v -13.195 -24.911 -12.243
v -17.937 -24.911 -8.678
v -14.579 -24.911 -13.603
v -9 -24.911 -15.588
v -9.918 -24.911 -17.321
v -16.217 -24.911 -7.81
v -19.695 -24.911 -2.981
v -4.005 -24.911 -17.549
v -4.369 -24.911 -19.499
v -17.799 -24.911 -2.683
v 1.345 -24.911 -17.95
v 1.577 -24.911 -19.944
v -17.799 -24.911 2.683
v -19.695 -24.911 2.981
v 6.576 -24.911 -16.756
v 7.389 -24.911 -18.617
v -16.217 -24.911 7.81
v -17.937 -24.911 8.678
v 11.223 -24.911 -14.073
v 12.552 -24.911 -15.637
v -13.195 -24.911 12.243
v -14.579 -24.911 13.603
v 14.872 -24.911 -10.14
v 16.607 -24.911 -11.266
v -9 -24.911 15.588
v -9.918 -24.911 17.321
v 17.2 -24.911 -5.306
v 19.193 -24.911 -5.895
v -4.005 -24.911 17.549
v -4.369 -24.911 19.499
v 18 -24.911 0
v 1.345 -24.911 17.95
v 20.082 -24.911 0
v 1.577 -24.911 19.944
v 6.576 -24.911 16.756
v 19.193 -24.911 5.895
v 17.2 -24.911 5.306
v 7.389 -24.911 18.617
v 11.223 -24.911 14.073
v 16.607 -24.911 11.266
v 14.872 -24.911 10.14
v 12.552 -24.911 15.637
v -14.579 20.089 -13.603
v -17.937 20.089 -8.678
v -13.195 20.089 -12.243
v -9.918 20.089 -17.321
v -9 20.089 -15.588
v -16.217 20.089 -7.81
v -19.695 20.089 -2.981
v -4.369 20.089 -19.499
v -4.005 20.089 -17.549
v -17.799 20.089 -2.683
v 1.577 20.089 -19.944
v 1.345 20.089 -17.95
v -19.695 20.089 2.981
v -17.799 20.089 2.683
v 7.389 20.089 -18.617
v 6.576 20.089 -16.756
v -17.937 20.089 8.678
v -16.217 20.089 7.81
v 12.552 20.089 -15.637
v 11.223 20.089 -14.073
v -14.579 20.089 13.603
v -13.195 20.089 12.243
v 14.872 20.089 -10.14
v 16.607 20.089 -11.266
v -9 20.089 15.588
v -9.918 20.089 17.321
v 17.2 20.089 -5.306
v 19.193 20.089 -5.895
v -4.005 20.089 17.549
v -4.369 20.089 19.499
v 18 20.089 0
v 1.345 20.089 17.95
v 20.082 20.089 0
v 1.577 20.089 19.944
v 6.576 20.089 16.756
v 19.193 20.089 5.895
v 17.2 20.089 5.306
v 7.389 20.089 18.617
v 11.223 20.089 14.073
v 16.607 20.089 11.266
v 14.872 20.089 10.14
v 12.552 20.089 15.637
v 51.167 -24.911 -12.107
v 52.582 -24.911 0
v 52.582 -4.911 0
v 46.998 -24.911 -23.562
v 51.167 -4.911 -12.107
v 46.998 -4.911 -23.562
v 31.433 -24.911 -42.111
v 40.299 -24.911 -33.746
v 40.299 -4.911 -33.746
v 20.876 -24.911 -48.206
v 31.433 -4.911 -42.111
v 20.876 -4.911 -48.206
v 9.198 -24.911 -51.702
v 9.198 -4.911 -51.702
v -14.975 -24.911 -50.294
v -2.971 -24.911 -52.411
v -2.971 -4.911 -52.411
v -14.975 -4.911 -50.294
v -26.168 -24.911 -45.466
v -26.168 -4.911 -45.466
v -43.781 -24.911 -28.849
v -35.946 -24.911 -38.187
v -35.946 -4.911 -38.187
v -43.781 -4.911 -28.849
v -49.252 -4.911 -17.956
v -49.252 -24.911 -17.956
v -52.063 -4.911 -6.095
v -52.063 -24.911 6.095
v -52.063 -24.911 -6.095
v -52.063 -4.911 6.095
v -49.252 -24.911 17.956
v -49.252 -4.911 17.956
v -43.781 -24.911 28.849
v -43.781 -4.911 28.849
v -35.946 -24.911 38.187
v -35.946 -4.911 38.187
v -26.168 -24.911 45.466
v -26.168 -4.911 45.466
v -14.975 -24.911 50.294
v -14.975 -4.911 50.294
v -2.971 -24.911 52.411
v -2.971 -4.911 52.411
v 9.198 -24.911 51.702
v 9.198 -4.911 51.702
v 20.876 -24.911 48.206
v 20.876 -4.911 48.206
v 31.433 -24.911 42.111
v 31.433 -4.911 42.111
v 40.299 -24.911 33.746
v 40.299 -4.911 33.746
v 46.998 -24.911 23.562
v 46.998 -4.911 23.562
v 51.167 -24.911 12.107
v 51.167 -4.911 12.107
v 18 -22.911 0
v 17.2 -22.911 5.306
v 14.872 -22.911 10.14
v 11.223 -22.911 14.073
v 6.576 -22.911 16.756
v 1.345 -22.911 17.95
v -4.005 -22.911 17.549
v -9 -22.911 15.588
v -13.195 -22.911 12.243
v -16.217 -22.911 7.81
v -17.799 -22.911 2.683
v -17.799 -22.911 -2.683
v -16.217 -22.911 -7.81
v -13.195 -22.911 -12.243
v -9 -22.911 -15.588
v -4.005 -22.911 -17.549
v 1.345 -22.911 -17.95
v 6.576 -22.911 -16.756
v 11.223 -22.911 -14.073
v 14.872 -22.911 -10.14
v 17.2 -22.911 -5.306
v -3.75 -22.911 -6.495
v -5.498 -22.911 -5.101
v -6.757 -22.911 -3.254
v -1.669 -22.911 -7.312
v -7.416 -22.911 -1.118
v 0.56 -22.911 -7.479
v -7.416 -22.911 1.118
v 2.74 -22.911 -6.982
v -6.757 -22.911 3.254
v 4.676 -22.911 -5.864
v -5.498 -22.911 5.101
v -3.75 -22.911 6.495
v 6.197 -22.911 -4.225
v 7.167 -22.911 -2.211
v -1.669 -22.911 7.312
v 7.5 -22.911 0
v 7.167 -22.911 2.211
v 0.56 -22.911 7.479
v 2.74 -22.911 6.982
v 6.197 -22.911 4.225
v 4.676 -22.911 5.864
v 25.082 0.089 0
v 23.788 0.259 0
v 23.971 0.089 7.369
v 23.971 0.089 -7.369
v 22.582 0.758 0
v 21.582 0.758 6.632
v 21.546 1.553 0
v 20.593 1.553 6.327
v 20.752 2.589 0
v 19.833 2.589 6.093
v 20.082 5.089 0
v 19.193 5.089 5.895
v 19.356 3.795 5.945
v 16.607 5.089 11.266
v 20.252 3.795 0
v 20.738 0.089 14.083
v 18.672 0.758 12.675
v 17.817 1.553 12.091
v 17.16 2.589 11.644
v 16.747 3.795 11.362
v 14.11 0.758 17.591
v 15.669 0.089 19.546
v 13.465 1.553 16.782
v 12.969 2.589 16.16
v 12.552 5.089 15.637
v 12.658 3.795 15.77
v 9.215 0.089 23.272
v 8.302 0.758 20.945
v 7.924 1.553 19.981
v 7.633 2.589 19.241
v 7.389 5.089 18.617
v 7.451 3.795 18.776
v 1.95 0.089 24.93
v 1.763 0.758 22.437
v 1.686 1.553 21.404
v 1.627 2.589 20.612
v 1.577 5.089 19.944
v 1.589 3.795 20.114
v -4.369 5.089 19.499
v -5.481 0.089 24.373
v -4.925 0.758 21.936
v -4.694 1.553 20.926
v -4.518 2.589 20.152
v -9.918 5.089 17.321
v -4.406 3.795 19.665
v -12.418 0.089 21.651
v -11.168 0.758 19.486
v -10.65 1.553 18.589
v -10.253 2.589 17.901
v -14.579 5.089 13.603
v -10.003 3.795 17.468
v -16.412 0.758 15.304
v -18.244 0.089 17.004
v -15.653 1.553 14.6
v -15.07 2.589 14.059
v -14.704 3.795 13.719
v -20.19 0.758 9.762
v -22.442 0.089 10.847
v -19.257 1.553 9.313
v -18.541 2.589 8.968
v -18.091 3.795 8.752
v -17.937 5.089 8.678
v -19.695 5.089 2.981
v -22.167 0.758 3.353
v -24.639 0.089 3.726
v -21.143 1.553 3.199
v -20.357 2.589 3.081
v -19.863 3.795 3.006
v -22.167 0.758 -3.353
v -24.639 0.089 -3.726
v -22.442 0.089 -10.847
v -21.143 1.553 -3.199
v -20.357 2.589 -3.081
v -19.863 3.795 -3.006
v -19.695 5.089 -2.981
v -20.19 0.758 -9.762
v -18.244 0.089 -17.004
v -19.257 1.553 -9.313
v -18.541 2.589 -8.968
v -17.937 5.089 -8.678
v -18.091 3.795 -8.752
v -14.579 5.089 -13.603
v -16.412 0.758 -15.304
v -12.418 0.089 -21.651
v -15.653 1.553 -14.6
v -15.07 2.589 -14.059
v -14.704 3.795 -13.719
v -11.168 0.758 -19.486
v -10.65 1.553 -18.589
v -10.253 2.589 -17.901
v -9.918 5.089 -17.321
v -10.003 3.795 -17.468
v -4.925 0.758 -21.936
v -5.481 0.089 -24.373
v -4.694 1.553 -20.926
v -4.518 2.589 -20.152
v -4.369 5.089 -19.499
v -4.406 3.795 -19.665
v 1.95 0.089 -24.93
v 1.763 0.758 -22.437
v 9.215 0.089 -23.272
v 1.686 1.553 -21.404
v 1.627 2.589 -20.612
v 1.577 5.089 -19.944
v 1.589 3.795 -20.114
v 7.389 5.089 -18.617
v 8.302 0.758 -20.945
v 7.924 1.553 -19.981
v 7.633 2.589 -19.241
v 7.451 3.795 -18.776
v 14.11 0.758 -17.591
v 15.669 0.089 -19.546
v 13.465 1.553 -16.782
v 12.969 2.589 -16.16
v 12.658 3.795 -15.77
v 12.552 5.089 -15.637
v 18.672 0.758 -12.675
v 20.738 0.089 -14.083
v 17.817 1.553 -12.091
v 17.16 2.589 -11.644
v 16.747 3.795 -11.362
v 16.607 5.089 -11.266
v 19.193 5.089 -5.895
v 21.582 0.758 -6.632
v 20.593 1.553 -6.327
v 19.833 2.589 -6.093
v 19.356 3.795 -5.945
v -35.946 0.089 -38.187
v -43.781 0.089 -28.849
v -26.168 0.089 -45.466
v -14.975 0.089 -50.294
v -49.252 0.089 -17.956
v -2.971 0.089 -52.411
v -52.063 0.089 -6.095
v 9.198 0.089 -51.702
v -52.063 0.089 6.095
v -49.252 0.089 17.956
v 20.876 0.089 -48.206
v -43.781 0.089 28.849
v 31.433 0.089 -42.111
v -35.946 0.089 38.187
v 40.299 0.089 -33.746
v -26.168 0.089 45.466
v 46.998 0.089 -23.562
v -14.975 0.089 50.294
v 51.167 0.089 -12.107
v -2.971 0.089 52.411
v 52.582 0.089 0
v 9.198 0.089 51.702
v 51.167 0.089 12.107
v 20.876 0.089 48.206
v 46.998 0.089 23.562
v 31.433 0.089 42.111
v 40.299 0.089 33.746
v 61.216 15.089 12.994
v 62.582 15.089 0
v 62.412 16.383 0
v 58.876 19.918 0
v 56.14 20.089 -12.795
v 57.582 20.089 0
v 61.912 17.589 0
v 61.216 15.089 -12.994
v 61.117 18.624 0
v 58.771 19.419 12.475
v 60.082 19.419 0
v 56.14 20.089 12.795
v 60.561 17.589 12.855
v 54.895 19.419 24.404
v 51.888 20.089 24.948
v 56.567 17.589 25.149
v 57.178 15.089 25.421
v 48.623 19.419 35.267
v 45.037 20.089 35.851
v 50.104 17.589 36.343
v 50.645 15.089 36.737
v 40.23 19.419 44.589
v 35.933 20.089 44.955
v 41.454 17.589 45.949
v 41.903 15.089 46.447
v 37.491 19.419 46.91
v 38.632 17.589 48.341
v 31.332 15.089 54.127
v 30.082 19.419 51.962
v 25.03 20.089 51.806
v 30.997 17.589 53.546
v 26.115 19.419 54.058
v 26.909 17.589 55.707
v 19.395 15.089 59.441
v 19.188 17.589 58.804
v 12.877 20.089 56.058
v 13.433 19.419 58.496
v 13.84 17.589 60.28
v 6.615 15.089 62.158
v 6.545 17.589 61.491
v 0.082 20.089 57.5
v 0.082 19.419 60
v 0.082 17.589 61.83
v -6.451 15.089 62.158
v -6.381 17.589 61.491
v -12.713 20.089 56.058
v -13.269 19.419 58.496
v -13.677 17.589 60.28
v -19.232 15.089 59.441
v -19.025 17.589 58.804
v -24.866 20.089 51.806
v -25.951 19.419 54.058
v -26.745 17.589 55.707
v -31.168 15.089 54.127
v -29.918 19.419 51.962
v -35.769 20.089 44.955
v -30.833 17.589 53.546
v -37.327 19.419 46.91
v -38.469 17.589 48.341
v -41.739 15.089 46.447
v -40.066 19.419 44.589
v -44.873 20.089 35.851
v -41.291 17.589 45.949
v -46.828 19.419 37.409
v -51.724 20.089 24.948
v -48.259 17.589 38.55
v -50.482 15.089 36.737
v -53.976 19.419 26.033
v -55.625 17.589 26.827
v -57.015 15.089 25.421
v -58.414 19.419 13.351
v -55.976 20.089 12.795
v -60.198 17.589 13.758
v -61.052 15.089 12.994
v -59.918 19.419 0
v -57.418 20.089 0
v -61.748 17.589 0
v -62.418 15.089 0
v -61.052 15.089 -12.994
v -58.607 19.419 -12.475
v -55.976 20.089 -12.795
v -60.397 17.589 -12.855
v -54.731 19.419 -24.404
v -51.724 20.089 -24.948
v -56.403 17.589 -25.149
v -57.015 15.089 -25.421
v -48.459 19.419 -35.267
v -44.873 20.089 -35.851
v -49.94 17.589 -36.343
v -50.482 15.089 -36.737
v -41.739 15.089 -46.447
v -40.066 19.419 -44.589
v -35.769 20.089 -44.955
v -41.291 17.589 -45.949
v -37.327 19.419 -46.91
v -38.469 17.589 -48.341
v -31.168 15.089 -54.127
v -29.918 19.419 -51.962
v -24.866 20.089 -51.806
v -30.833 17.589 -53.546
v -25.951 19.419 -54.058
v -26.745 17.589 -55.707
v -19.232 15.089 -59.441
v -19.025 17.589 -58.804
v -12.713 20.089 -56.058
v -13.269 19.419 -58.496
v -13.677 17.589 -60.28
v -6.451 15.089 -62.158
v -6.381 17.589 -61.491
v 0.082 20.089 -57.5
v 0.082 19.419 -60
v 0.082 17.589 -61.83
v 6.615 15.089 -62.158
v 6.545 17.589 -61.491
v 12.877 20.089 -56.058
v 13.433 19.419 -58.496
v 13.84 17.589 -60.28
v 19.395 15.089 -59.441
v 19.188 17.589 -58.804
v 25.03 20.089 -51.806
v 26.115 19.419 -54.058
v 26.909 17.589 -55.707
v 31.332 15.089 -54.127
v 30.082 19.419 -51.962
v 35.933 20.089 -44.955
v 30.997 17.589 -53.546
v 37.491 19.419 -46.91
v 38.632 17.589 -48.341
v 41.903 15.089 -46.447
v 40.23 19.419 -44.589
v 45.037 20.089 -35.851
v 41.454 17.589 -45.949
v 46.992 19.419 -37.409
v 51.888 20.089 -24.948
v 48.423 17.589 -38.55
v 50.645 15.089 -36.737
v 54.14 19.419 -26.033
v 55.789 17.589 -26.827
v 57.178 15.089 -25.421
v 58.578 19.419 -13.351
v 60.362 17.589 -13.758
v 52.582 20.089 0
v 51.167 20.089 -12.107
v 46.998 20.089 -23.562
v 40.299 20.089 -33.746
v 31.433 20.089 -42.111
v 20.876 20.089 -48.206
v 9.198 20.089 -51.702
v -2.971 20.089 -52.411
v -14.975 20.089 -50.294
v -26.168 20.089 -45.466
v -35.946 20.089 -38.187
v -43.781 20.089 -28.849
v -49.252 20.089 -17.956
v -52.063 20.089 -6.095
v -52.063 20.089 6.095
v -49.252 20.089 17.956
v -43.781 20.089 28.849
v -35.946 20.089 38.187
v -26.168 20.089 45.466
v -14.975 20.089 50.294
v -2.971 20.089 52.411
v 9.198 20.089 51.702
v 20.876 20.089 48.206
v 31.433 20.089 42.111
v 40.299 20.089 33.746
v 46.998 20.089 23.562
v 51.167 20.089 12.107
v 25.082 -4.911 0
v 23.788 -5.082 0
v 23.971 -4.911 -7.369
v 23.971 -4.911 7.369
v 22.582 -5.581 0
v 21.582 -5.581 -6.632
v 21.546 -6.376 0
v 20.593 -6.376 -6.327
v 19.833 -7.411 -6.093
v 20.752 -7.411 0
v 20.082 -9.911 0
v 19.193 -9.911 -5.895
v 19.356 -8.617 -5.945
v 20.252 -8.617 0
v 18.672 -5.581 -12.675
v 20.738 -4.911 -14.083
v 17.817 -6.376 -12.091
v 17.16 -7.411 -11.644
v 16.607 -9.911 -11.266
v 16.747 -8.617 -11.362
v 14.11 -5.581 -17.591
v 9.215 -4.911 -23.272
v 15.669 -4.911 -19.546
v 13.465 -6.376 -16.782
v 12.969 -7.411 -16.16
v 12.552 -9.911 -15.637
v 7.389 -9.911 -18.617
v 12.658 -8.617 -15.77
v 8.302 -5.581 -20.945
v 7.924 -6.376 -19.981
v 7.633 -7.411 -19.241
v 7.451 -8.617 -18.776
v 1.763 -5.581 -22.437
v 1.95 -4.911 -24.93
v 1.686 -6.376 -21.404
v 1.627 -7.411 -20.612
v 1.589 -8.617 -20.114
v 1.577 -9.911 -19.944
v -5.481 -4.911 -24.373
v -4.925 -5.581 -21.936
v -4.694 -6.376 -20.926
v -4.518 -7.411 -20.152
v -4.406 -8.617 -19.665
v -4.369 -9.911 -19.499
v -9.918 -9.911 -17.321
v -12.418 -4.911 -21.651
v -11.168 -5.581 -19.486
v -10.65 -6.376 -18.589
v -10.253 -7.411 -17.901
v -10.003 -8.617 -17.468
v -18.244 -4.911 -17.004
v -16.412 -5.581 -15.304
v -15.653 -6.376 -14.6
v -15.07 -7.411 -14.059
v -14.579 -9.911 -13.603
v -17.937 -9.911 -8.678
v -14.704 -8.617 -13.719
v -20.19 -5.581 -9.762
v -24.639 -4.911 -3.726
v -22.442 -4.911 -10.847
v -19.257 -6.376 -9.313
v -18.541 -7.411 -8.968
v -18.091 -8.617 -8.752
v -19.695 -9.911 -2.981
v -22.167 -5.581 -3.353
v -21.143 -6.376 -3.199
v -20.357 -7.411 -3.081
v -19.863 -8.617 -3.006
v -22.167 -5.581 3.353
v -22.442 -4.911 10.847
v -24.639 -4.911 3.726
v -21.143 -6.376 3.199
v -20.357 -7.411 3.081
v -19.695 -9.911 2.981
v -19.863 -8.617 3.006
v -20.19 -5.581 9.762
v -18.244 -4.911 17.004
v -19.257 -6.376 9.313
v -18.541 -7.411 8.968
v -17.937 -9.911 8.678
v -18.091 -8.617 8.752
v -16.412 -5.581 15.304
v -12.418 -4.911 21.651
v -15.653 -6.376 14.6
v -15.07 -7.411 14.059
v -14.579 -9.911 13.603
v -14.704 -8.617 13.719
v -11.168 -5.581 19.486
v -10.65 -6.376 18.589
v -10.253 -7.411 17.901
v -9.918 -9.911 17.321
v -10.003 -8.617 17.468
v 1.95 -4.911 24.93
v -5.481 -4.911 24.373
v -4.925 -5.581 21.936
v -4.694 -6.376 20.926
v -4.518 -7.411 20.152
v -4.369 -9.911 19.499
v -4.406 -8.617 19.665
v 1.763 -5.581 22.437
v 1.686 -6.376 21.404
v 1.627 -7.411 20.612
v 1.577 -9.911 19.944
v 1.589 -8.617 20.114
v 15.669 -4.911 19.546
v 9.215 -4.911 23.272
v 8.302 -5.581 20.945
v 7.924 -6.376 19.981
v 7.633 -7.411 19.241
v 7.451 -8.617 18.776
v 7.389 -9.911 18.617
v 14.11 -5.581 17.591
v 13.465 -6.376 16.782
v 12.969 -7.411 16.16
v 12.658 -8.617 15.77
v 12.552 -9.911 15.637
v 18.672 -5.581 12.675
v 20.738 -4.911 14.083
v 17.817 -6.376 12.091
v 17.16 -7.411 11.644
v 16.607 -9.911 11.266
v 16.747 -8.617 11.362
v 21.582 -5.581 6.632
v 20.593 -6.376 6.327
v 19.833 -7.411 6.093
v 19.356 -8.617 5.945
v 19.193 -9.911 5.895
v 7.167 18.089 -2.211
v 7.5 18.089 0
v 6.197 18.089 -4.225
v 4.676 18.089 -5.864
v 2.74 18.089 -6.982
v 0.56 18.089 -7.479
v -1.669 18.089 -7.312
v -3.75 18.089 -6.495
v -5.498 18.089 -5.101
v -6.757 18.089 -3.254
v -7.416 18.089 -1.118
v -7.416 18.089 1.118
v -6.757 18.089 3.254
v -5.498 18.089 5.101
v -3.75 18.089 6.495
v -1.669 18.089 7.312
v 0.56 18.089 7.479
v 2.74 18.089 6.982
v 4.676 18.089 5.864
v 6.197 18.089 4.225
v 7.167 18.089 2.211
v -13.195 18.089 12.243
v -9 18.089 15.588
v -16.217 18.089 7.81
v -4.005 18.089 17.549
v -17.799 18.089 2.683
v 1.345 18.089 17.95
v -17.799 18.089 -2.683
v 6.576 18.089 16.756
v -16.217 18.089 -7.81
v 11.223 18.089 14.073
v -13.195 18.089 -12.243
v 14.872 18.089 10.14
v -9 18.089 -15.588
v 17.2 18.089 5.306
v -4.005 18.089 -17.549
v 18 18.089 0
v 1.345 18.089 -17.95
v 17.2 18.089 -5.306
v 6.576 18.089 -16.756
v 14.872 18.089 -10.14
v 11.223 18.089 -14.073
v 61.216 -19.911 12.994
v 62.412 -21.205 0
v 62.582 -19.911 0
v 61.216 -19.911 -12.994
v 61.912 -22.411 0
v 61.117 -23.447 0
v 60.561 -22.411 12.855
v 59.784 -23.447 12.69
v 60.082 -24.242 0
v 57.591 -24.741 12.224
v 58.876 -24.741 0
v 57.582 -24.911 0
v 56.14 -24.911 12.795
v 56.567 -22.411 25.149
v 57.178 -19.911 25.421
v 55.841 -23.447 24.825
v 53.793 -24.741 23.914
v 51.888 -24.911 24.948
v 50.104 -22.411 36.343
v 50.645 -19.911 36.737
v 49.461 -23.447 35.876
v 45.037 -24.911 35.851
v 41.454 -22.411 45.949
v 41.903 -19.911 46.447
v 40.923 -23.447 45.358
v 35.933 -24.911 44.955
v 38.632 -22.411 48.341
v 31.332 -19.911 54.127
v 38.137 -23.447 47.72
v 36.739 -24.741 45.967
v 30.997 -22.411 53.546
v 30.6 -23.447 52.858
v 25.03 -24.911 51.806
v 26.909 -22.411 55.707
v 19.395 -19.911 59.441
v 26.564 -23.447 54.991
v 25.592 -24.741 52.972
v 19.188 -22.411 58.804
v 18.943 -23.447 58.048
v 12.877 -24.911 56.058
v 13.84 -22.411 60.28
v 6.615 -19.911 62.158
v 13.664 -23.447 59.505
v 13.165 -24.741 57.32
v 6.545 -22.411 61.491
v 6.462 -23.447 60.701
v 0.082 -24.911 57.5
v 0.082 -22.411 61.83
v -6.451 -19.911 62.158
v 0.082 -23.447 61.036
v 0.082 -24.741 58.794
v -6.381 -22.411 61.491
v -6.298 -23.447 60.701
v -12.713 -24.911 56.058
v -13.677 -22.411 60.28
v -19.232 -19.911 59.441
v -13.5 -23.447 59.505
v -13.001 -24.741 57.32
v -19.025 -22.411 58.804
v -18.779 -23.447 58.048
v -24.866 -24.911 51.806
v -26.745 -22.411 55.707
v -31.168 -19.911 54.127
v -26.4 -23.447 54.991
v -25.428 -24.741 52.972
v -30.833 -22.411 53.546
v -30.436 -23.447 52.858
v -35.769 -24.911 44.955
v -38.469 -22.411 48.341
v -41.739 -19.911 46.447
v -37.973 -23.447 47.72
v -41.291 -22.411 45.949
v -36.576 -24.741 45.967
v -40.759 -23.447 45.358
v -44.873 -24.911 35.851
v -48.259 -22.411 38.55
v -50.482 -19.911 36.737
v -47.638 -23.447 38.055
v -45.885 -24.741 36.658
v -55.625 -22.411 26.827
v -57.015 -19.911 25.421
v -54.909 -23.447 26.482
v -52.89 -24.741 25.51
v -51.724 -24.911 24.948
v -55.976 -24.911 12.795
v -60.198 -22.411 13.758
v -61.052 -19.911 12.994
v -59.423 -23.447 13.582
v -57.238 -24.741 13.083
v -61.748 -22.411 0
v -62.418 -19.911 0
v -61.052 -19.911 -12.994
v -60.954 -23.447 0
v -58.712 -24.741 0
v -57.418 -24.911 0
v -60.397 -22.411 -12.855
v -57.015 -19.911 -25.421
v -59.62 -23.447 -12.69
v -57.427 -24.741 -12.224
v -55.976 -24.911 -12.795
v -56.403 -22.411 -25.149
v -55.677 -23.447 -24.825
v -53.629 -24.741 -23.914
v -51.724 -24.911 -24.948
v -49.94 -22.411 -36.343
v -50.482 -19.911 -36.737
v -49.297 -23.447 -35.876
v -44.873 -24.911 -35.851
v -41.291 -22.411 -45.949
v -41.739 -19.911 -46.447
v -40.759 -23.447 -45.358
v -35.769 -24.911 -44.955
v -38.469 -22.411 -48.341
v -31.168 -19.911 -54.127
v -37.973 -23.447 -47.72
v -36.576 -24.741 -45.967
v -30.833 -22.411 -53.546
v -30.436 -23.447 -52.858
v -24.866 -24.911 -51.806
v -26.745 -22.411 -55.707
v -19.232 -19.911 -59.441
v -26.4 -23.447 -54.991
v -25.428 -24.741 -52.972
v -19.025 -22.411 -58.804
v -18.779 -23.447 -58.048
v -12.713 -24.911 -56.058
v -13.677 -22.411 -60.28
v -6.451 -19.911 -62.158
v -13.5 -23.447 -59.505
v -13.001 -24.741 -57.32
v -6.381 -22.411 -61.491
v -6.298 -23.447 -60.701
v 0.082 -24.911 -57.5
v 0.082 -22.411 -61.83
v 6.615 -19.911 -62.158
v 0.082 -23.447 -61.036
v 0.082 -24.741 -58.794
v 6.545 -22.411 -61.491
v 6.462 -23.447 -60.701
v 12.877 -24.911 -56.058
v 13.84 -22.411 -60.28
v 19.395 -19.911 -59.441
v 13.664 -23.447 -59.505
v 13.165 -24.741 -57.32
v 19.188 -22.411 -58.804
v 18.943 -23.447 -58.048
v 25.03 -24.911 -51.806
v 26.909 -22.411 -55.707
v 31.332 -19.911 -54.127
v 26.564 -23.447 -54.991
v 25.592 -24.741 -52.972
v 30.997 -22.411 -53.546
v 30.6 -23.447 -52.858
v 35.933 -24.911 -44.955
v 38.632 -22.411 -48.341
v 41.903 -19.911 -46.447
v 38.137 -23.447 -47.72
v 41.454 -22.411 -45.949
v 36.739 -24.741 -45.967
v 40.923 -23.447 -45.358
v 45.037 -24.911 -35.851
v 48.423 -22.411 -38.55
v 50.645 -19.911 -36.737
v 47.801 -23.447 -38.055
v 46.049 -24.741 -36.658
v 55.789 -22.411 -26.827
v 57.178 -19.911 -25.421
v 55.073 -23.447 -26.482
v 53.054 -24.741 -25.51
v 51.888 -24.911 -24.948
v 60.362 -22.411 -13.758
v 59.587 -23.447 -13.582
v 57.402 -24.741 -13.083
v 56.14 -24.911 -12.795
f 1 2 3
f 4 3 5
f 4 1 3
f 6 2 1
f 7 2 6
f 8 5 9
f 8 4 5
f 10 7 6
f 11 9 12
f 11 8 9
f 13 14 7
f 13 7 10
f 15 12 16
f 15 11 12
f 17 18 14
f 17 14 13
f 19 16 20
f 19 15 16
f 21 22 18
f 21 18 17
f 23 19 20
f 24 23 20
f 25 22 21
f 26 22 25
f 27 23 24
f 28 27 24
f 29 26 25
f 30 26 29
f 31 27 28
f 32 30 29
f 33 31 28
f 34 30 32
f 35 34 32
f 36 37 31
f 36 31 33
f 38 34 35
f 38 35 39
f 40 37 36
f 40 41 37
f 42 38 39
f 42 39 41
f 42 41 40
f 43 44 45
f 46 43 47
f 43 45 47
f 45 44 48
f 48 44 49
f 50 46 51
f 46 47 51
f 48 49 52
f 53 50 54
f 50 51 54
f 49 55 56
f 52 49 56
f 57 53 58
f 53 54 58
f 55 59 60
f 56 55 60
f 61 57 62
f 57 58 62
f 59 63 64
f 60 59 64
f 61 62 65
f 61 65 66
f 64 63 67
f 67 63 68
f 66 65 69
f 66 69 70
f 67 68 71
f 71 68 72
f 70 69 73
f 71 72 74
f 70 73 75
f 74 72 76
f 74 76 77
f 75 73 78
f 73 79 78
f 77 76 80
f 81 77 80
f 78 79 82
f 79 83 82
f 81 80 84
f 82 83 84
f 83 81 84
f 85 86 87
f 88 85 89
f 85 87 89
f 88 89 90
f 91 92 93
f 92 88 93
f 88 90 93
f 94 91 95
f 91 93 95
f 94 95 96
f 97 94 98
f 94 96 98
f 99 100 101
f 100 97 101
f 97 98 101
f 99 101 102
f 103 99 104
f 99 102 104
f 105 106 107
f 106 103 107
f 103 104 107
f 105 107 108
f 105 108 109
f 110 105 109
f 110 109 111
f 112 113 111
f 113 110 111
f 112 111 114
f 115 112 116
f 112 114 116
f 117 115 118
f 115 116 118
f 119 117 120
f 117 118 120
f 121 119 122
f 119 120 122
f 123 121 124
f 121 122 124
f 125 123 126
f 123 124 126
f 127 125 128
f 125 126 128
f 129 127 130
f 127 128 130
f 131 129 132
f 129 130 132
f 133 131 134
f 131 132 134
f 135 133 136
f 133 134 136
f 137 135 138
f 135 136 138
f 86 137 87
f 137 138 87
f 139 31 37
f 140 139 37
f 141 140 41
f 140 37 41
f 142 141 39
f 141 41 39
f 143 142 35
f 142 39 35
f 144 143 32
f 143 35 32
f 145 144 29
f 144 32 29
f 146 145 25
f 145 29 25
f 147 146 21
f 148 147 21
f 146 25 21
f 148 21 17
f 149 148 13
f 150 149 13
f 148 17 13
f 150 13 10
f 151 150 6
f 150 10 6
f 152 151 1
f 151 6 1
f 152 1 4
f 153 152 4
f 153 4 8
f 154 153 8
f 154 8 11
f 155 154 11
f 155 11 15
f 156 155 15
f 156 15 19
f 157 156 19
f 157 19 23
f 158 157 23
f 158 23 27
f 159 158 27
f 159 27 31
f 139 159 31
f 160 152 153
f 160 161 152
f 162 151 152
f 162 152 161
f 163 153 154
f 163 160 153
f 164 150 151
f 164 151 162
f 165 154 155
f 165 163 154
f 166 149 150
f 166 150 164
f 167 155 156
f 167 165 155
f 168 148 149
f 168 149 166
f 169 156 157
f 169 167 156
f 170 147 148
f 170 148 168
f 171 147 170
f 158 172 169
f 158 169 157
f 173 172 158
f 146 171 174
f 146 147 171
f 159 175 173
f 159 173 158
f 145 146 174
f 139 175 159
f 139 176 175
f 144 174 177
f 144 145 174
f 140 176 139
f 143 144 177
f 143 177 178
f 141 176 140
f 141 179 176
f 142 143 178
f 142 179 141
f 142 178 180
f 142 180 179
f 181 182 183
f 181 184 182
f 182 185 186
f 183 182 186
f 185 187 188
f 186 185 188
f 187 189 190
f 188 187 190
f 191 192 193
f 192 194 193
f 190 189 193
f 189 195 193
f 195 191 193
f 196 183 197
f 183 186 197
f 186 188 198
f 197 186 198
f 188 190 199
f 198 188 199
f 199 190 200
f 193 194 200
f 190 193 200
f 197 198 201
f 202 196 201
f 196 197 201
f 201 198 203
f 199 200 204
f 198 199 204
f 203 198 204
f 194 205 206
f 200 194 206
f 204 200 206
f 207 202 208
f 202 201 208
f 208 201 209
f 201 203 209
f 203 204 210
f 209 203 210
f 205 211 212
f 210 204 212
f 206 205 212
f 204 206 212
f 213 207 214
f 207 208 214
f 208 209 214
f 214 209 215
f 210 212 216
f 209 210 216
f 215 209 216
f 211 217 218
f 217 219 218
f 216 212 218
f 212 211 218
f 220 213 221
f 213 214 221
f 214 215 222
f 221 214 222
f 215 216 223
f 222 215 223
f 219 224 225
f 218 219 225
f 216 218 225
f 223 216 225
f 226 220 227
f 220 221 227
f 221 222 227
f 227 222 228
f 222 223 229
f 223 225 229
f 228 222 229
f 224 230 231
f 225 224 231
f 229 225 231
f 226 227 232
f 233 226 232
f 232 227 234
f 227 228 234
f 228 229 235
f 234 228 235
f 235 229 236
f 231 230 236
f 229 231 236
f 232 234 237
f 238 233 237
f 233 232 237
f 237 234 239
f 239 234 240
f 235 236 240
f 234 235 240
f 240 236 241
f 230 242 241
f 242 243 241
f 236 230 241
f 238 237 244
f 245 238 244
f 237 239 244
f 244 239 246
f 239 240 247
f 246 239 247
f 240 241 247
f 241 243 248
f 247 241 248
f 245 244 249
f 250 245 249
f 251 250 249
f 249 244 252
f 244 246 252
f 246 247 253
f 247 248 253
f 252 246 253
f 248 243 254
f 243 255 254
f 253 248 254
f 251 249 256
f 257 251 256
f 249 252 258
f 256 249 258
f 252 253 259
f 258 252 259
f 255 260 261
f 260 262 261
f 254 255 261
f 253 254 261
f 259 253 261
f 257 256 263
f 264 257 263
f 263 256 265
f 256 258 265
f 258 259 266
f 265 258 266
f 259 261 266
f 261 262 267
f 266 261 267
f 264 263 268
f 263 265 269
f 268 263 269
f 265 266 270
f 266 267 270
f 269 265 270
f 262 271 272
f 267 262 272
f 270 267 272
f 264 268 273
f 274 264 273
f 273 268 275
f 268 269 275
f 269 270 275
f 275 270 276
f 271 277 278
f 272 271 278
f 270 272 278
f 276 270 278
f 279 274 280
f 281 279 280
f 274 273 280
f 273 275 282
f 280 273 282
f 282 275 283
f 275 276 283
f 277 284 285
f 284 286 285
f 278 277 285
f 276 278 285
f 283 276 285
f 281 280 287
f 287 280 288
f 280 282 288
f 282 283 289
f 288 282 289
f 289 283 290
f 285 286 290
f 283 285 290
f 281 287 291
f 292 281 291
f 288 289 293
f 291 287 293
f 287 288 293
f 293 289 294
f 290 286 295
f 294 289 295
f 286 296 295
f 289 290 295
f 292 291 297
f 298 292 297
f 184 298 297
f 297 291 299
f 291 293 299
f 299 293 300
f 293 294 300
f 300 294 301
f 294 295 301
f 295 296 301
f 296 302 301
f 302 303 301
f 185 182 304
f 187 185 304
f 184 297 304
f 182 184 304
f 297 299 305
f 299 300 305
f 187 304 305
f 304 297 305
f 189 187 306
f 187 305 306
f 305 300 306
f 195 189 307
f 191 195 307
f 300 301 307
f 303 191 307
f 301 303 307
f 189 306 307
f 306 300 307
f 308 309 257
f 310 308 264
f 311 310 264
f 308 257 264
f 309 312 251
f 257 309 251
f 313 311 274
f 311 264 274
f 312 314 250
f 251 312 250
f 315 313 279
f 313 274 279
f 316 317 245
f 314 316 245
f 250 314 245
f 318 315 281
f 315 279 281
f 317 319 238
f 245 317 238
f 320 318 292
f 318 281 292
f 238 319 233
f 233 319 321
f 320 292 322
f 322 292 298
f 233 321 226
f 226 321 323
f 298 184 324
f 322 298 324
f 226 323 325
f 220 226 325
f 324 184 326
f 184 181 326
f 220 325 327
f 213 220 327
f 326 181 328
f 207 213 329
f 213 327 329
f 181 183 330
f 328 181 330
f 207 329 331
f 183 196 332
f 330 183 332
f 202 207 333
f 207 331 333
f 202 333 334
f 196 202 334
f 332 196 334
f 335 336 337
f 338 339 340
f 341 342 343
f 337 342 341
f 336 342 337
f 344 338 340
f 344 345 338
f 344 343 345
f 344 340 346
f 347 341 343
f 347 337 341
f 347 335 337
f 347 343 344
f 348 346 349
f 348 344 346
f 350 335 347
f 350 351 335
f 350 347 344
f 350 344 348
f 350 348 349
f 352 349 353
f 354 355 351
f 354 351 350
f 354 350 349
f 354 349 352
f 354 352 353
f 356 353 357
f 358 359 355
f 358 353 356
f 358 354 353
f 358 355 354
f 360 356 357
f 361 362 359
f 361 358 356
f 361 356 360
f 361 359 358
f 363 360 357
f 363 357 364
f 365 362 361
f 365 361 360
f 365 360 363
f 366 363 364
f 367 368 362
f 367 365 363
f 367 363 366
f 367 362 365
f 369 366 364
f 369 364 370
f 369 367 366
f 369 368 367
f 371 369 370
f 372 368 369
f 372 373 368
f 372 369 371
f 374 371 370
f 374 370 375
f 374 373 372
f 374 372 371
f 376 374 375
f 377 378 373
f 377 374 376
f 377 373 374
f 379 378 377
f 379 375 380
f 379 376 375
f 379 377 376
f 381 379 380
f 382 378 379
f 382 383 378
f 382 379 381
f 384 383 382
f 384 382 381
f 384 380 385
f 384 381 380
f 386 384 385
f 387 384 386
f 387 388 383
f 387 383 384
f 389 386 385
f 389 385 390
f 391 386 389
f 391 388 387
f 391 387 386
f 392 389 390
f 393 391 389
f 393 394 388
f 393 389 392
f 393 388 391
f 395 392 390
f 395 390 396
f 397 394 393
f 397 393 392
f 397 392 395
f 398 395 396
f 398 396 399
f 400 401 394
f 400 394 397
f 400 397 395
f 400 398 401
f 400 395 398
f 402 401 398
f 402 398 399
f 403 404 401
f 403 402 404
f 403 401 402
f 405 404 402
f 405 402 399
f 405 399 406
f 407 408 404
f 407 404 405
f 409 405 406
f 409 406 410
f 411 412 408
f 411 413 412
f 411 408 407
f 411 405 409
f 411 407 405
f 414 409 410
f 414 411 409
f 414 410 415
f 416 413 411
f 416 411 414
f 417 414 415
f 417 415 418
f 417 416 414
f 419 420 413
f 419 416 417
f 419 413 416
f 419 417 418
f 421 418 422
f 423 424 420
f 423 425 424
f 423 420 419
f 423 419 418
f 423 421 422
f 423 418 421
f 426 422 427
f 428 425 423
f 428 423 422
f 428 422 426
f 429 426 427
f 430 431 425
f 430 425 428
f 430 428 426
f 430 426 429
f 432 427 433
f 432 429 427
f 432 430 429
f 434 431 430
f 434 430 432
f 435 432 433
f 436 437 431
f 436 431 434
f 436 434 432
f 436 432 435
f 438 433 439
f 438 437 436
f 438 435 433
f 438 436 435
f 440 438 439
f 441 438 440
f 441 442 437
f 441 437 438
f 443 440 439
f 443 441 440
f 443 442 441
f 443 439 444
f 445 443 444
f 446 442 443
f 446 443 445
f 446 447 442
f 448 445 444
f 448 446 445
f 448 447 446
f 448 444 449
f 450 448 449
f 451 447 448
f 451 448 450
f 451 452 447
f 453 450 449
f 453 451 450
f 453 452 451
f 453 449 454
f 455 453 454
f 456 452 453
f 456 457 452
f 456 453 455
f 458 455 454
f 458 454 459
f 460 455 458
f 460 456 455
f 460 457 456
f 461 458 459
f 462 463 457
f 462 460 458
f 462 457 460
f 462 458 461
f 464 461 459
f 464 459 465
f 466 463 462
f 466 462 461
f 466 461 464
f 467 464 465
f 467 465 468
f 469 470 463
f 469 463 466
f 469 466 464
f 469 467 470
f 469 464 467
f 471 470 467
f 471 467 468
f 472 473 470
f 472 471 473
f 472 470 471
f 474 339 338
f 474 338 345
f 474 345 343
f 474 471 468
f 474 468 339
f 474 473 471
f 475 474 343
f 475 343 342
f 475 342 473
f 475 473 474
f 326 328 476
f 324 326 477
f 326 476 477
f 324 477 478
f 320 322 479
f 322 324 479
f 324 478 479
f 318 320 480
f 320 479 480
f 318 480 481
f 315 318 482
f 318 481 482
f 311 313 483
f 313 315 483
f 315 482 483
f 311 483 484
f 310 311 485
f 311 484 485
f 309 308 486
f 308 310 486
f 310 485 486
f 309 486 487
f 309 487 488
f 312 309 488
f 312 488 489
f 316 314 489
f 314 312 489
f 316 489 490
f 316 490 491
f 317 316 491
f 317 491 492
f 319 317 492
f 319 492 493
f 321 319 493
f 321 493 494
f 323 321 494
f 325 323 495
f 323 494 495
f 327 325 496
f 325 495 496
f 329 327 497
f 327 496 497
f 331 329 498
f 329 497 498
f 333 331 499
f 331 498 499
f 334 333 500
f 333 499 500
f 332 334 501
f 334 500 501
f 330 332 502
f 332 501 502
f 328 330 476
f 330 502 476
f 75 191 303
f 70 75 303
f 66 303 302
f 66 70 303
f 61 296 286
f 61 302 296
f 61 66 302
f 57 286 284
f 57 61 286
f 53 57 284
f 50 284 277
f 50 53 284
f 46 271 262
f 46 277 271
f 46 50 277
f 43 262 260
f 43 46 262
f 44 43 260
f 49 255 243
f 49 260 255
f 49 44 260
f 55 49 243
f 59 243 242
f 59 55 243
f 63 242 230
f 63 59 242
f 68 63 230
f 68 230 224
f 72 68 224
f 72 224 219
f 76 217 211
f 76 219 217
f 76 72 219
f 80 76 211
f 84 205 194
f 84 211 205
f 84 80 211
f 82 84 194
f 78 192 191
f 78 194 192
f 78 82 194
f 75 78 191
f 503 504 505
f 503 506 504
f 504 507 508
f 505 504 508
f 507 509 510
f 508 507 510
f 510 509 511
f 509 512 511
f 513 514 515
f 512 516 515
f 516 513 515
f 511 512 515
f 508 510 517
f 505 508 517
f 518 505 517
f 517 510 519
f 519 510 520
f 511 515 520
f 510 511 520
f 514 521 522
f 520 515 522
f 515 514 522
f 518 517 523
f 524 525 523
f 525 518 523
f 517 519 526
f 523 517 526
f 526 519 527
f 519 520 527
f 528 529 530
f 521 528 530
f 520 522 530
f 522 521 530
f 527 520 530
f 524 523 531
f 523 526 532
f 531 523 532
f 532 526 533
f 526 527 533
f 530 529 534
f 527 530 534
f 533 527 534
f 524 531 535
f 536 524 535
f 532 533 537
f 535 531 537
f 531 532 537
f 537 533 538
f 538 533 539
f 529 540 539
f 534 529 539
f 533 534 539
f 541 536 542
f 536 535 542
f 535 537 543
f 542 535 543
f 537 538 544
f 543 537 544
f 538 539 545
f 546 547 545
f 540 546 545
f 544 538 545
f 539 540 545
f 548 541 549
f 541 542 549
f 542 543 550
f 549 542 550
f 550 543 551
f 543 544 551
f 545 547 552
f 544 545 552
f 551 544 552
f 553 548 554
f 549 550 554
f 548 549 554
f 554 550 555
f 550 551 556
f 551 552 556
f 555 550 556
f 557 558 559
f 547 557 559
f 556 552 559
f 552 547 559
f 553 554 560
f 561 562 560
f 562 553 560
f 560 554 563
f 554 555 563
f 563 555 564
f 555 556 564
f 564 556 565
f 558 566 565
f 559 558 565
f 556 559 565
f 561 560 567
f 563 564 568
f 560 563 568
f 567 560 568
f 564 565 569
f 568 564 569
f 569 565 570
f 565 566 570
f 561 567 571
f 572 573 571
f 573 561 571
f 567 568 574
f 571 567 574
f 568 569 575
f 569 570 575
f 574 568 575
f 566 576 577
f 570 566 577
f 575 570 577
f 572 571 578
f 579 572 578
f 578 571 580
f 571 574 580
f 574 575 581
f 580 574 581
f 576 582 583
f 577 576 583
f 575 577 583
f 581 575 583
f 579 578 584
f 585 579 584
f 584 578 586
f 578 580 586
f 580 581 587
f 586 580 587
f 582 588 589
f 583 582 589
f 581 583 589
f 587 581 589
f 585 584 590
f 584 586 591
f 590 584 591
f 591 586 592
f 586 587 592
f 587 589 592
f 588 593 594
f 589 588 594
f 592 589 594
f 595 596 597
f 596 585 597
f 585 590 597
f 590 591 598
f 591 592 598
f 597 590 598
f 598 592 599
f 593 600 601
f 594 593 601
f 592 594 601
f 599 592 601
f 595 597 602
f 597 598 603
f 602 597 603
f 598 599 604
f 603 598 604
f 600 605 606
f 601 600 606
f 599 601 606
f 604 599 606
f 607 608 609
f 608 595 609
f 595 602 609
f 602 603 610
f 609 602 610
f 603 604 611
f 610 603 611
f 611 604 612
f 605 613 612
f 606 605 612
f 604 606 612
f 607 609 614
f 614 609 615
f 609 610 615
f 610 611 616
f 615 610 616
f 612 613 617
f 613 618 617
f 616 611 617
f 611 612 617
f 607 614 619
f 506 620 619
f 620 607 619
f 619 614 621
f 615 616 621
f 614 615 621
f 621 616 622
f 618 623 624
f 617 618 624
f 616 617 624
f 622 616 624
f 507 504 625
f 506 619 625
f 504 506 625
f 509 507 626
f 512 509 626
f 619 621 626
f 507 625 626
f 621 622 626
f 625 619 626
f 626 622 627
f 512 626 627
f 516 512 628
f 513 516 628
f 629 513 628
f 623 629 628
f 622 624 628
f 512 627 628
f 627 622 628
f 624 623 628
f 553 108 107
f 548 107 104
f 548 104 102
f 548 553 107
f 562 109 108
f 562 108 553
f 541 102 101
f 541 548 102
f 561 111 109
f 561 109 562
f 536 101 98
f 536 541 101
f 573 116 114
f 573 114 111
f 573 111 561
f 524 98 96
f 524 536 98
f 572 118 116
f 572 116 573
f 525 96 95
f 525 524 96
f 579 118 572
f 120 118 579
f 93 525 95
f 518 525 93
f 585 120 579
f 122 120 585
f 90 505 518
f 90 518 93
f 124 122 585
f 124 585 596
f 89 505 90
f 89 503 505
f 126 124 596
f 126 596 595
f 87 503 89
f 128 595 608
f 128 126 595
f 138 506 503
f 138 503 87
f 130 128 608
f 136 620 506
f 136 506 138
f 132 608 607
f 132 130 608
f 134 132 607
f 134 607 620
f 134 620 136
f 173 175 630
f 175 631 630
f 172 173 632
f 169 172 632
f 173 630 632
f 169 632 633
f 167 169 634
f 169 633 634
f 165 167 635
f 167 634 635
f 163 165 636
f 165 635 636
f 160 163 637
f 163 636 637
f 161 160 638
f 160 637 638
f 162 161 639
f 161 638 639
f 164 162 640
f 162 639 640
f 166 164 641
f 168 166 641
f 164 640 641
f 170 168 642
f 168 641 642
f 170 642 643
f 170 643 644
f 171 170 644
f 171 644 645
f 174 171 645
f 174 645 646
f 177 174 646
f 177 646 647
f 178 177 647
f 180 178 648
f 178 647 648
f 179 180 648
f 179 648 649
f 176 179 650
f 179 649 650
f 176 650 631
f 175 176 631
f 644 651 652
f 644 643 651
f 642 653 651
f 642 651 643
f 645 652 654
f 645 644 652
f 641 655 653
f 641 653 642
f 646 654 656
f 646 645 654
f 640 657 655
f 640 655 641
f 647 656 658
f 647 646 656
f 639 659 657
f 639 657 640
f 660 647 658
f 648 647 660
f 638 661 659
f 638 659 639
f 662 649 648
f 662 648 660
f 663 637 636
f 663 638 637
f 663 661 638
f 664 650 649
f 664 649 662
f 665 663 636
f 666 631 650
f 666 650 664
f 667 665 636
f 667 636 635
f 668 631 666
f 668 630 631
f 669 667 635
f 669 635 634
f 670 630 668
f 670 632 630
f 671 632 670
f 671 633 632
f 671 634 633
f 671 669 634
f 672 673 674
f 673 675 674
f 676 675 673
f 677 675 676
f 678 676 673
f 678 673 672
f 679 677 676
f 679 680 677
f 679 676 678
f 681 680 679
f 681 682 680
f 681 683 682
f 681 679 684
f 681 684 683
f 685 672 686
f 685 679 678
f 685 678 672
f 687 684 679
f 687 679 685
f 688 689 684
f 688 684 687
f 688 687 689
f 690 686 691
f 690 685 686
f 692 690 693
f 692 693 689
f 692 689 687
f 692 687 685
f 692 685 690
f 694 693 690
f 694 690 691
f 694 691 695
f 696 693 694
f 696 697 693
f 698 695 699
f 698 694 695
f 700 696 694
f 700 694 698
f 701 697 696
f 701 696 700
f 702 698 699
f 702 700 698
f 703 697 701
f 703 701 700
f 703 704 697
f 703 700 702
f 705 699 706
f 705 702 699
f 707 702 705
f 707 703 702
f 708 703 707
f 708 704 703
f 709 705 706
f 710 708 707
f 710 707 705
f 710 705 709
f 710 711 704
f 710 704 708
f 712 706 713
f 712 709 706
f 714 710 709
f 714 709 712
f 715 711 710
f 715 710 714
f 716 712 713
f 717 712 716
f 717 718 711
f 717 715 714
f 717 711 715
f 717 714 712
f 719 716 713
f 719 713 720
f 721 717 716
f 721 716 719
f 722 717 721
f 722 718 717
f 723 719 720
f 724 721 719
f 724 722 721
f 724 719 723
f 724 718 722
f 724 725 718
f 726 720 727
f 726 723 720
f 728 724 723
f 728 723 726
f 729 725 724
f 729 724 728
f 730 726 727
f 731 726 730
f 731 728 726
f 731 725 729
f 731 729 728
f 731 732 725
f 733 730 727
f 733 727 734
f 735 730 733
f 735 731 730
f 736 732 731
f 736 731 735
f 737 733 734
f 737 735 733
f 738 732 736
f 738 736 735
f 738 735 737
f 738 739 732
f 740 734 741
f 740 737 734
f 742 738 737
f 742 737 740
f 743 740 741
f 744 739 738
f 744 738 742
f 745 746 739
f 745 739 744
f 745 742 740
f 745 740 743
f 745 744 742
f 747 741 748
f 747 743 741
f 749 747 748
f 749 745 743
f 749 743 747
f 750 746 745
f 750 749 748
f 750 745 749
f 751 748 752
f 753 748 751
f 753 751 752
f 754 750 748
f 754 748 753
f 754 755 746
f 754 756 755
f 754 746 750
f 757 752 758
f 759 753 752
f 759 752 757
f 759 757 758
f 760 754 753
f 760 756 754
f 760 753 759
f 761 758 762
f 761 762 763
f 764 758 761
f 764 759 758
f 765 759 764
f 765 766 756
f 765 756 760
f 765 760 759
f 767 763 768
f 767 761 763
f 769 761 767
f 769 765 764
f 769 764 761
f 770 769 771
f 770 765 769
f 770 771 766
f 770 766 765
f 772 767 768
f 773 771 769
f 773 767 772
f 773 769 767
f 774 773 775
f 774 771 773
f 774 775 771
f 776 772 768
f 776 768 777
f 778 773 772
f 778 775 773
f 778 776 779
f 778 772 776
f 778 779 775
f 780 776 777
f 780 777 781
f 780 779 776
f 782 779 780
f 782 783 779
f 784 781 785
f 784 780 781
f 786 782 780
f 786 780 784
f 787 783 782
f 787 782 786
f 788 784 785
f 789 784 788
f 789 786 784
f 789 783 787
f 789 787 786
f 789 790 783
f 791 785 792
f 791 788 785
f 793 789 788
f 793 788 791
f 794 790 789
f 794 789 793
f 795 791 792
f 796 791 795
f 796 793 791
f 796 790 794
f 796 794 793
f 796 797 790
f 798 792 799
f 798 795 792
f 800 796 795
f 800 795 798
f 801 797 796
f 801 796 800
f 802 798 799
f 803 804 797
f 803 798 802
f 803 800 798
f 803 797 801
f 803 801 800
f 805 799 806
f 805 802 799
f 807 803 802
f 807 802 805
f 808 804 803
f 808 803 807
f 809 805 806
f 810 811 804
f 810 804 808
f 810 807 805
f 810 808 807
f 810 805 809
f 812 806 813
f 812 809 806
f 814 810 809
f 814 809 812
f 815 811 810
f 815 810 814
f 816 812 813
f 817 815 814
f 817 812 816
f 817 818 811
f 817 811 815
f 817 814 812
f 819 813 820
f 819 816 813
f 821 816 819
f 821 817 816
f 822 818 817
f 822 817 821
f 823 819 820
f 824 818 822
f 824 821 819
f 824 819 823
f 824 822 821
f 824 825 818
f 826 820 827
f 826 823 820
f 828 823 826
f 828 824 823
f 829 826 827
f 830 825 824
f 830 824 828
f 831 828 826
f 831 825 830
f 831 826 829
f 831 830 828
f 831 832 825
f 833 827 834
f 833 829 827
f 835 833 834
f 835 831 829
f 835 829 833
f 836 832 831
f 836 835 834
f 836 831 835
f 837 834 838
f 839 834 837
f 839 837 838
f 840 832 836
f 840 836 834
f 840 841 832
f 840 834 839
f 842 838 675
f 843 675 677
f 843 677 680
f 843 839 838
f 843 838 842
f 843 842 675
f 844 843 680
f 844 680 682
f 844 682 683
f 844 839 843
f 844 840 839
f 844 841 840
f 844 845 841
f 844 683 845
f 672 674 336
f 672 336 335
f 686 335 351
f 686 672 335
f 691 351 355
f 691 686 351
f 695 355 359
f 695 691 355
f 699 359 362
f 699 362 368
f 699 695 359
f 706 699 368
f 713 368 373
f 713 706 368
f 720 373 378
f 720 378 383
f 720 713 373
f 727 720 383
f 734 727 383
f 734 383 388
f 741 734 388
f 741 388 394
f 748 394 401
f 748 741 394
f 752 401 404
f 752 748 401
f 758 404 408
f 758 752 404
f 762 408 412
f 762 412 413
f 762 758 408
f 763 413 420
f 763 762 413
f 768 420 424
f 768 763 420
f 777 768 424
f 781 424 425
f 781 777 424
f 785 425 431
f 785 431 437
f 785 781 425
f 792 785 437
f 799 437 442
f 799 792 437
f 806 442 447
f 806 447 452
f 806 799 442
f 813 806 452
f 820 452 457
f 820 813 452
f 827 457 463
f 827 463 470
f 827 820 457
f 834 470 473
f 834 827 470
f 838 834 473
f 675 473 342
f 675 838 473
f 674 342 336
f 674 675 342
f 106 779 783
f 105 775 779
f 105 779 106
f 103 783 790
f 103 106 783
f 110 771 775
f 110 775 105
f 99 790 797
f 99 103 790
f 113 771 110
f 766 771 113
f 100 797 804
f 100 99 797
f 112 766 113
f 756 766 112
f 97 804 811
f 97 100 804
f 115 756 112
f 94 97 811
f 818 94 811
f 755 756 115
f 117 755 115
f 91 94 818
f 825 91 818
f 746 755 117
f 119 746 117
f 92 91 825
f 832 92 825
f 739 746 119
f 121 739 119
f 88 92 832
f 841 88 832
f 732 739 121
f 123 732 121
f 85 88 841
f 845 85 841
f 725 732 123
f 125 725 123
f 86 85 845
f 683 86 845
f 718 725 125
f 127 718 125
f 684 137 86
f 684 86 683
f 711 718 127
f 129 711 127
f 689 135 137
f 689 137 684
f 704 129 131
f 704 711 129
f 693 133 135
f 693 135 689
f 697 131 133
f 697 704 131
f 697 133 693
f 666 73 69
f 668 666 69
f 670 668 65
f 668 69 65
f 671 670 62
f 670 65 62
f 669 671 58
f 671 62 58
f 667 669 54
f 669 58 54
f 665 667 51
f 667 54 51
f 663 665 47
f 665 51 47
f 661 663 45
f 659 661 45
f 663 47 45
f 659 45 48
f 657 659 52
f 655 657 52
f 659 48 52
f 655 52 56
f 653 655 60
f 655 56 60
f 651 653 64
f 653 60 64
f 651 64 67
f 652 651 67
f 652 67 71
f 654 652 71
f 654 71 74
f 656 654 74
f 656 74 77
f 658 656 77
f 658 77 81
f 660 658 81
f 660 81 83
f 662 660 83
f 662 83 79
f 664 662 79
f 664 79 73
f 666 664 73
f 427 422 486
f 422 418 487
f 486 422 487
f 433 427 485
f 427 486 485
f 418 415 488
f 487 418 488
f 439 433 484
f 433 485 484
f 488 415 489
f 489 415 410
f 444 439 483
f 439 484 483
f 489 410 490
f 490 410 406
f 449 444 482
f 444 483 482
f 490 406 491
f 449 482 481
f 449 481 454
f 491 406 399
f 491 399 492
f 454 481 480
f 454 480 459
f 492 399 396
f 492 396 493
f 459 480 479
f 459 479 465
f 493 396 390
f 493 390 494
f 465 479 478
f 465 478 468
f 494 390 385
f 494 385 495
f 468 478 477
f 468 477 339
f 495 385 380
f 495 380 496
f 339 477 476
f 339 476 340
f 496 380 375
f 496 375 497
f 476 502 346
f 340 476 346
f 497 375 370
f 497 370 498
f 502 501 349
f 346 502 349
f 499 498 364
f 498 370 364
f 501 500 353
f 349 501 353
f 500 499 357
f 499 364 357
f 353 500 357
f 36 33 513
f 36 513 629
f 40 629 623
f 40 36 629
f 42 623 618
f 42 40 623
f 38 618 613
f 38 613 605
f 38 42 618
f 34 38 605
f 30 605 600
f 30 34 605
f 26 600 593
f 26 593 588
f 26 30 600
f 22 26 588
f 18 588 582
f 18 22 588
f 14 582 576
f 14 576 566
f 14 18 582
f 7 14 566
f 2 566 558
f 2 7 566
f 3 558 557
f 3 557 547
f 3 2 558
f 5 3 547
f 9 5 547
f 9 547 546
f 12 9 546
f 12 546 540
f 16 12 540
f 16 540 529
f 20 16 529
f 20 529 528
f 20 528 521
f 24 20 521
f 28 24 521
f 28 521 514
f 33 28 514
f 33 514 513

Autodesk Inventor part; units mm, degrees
ref_plane "YZ Plane" through (0, 0, 0) normal (1, 0, 0) x (0, 1, 0)
ref_plane "XZ Plane" through (0, 0, 0) normal (0, 1, 0) x (-1, 0, 0)
ref_plane "XY Plane" through (0, 0, 0) normal (0, 0, 1) x (1, 0, 0)
sketch "Sketch1" plane through (0, 0, 0) normal (0, 0, 1) x (1, 0, 0)
  line L0 (0.0819, 48.1439) -> (0.0819, -16.0521)
  line L1 (0.0819, 0.0886) -> (20.0819, 0.0886)
  line L2 (20.0819, 0.0886) -> (20.0819, 20.0886)
  line L3 (20.0819, 20.0886) -> (0.0819, 20.0886)
  line L4 (0.0819, 20.0886) -> (0.0819, 0.0886)
  line L5 (0.0819, 0.0886) -> (62.5819, 0.0886)
  line L6 (62.5819, 0.0886) -> (62.5819, -4.9114)
  line L7 (62.5819, -4.9114) -> (0.0819, -4.9114)
  line L8 (0.0819, -4.9114) -> (0.0819, 0.0886)
  line L9 (62.5819, 0.0886) -> (52.5819, 0.0886)
  line L10 (52.5819, 0.0886) -> (52.5819, 20.0886)
  line L11 (52.5819, 20.0886) -> (62.5819, 20.0886)
  line L12 (62.5819, 20.0886) -> (62.5819, 0.0886)
  line L13 (0.0819, -4.9114) -> (20.0819, -4.9114)
  line L14 (20.0819, -4.9114) -> (20.0819, -24.9114)
  line L15 (20.0819, -24.9114) -> (0.0819, -24.9114)
  line L16 (0.0819, -24.9114) -> (0.0819, -4.9114)
  line L17 (52.5819, -4.9114) -> (62.5819, -4.9114)
  line L18 (62.5819, -4.9114) -> (62.5819, -24.9114)
  line L19 (62.5819, -24.9114) -> (52.5819, -24.9114)
  line L20 (52.5819, -24.9114) -> (52.5819, -4.9114)
  dimension "d4" = 62.5
  dimension "d5" = 20
  dimension "d6" = 20
  dimension "d7" = 20
  dimension "d8" = 10
  dimension "d10" = 20
  dimension "d11" = 20
  dimension "d12" = 5
  dimension "d13" = 20
  dimension "d14" = 10
revolve "Revolution2" add sketch "Sketch1" angle 360 about axis through (0.0819, 48.1439, 0) along (0, -1, 0)
fillet "Fillet1" radius 5 2 edges at (-62.4181, 20.0886, 0) (-62.4181, -24.9114, 0)
fillet "Fillet2" radius 5 1 edges at (-19.9181, 0.0886, 0)
fillet "Fillet3" radius 5 1 edges at (-19.9181, -4.9114, 0)
sketch "Sketch2" plane through (0.0819, 20.0886, 0) normal (0, 1, 0) x (1, 0, 0)
  circle A0 centre (-0.0819, 0) radius 18
  dimension "d21" = 36
extrude "Extrusion1" cut sketch "Sketch2" against normal blind 2
sketch "Sketch3" plane through (0.0819, -24.9114, 0) normal (0, -1, 0) x (1, 0, 0)
  circle A0 centre (-0.0819, 0) radius 18
  dimension "d22" = 36
extrude "Extrusion2" cut sketch "Sketch3" against normal blind 2
sketch "Sketch4" plane through (0, 18.0886, 0) normal (0, 1, 0) x (1, 0, 0)
  circle A0 centre (0, 0) radius 7.5
  dimension "d25" = 15
extrude "Extrusion3" cut sketch "Sketch4" against normal through all
properties part number "Wheel" material "Polyethylene, High Density"
